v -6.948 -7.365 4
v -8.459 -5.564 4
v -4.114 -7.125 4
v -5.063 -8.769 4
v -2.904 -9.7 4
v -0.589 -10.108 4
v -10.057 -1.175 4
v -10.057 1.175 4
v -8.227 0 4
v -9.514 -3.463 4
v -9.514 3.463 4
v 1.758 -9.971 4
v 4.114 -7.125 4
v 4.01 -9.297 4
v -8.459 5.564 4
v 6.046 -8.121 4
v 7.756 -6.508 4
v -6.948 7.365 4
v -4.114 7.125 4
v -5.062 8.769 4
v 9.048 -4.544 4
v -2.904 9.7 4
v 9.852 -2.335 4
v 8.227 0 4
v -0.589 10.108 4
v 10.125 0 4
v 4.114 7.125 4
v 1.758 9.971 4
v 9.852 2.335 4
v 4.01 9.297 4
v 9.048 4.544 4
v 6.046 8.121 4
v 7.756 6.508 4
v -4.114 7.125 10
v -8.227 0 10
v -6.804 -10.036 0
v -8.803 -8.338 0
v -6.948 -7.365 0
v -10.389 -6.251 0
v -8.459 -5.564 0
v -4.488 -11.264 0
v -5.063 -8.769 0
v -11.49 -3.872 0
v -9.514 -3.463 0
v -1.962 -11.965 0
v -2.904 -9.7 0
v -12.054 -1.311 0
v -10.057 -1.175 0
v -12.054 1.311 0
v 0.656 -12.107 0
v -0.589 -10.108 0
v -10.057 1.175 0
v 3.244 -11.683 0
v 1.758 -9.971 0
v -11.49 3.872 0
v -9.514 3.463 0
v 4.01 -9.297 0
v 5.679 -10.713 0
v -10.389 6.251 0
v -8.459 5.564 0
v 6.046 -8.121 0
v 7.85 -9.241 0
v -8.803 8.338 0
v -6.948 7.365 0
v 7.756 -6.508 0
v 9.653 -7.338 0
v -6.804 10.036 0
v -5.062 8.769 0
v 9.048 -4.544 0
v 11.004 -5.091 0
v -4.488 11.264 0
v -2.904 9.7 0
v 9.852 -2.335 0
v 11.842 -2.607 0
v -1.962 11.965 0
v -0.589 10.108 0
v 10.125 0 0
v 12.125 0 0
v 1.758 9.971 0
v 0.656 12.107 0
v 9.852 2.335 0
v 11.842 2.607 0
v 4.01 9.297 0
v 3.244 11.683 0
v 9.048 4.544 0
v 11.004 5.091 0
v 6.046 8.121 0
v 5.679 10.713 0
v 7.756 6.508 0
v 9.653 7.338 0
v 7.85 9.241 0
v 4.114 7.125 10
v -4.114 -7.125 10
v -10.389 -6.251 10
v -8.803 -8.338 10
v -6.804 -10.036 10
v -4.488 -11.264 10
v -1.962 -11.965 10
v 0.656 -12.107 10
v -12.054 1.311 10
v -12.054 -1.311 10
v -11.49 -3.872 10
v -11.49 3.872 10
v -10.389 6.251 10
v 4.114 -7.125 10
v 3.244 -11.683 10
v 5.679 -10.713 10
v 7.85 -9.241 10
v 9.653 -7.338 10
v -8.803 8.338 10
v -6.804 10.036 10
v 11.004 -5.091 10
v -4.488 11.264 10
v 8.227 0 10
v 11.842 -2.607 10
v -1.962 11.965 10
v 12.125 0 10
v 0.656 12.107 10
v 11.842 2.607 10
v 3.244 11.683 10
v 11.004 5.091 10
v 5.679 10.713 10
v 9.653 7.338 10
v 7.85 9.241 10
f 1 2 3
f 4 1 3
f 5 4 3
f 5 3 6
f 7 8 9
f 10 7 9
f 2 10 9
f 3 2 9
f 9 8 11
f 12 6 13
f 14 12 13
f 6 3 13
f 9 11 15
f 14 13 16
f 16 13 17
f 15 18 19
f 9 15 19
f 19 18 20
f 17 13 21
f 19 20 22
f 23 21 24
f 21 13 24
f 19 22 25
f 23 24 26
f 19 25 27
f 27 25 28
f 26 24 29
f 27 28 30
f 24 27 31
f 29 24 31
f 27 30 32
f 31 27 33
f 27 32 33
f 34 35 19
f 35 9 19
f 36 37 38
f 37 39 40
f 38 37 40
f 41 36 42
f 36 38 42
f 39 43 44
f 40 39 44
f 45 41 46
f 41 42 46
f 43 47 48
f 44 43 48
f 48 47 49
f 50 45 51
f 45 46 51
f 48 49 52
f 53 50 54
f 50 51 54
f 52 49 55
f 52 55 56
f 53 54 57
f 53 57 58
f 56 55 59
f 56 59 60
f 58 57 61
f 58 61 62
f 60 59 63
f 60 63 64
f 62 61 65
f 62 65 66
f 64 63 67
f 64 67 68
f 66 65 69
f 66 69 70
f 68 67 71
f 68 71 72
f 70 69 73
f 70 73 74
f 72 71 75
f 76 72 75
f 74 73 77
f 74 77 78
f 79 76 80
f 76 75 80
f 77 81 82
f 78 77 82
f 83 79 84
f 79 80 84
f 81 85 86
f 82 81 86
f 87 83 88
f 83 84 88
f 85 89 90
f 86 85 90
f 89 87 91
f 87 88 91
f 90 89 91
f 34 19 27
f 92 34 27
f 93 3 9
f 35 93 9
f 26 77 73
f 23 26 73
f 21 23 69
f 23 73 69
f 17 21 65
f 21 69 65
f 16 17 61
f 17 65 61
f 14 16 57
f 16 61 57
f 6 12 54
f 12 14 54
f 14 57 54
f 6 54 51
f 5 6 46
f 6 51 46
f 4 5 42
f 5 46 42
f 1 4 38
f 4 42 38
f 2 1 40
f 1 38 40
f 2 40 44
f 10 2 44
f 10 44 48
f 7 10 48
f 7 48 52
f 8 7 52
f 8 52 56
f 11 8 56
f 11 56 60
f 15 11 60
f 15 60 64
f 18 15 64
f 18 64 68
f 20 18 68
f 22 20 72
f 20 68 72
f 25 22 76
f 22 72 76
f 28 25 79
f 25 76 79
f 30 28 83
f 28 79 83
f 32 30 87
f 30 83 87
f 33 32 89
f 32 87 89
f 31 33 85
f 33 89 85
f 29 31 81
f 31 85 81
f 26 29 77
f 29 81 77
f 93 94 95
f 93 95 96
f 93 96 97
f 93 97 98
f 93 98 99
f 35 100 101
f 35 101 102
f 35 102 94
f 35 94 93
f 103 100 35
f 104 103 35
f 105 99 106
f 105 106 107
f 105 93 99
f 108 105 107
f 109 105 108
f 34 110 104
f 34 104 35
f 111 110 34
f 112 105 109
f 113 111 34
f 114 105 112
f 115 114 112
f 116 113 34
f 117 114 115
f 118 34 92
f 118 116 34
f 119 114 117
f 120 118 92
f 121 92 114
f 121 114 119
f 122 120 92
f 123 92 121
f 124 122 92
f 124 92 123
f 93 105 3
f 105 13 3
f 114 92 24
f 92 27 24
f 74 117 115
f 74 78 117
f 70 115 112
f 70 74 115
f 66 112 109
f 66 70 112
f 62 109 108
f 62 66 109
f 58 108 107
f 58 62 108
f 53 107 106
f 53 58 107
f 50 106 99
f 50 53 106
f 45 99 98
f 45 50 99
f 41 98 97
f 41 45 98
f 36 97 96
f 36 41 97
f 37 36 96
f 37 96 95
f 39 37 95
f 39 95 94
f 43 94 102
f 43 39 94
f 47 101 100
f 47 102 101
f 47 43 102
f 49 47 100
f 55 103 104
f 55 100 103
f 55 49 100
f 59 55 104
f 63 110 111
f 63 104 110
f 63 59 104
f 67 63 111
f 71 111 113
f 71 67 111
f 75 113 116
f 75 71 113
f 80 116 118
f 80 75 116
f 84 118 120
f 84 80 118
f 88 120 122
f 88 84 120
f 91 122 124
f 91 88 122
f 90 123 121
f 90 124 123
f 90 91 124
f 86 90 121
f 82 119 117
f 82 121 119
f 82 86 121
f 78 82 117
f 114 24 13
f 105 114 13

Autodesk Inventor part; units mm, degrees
ref_plane "YZ Plane" through (0, 0, 0) normal (1, 0, 0) x (0, 1, 0)
ref_plane "XZ Plane" through (0, 0, 0) normal (0, 1, 0) x (-1, 0, 0)
ref_plane "XY Plane" through (0, 0, 0) normal (0, 0, 1) x (1, 0, 0)
sketch "Sketch1" plane through (0, 0, 0) normal (0, 0, 1) x (1, 0, 0)
  circle A0 centre (0, 0) radius 10.125
  circle A1 centre (0, 0) radius 12.125
  dimension "d0" = 20.25
  dimension "d1" = 2
extrude "Extrusion1" add sketch "Sketch1" along normal blind 4
sketch "Sketch2" plane through (0, 0, 4) normal (0, 0, 1) x (1, 0, 0)
  circle A0 centre (0, 0) radius 10.125 projected
  line L0 (4.1136, 7.125) -> (8.2272, 0)
  line L1 (8.2272, 0) -> (4.1136, -7.125)
  line L2 (4.1136, -7.125) -> (-4.1136, -7.125)
  line L3 (-4.1136, -7.125) -> (-8.2272, 0)
  line L4 (-8.2272, 0) -> (-4.1136, 7.125)
  line L5 (-4.1136, 7.125) -> (4.1136, 7.125)
  line L6 (-16.975, 0) -> (16.975, 0) projected
  line L7 (0, -16.975) -> (0, 16.975) projected
  circle A1 centre (0, 0) radius 12.125 projected
  point P0 (0, 7.125)
  dimension "d4" = 14.25
extrude "Extrusion2" add sketch "Sketch2" along normal blind 6 contours L6 L0 L5 L7 A0 | L6 A1 L7 A0 | A0 L7 L2 L1 L6 | A0 L7 A1 L6 | L7 L5 L4 L6 A0 | A0 L6 A1 L7 | L7 A1 L6 A0 | A0 L6 L3 L2 L7
properties part number "BatterySafetyCap"
